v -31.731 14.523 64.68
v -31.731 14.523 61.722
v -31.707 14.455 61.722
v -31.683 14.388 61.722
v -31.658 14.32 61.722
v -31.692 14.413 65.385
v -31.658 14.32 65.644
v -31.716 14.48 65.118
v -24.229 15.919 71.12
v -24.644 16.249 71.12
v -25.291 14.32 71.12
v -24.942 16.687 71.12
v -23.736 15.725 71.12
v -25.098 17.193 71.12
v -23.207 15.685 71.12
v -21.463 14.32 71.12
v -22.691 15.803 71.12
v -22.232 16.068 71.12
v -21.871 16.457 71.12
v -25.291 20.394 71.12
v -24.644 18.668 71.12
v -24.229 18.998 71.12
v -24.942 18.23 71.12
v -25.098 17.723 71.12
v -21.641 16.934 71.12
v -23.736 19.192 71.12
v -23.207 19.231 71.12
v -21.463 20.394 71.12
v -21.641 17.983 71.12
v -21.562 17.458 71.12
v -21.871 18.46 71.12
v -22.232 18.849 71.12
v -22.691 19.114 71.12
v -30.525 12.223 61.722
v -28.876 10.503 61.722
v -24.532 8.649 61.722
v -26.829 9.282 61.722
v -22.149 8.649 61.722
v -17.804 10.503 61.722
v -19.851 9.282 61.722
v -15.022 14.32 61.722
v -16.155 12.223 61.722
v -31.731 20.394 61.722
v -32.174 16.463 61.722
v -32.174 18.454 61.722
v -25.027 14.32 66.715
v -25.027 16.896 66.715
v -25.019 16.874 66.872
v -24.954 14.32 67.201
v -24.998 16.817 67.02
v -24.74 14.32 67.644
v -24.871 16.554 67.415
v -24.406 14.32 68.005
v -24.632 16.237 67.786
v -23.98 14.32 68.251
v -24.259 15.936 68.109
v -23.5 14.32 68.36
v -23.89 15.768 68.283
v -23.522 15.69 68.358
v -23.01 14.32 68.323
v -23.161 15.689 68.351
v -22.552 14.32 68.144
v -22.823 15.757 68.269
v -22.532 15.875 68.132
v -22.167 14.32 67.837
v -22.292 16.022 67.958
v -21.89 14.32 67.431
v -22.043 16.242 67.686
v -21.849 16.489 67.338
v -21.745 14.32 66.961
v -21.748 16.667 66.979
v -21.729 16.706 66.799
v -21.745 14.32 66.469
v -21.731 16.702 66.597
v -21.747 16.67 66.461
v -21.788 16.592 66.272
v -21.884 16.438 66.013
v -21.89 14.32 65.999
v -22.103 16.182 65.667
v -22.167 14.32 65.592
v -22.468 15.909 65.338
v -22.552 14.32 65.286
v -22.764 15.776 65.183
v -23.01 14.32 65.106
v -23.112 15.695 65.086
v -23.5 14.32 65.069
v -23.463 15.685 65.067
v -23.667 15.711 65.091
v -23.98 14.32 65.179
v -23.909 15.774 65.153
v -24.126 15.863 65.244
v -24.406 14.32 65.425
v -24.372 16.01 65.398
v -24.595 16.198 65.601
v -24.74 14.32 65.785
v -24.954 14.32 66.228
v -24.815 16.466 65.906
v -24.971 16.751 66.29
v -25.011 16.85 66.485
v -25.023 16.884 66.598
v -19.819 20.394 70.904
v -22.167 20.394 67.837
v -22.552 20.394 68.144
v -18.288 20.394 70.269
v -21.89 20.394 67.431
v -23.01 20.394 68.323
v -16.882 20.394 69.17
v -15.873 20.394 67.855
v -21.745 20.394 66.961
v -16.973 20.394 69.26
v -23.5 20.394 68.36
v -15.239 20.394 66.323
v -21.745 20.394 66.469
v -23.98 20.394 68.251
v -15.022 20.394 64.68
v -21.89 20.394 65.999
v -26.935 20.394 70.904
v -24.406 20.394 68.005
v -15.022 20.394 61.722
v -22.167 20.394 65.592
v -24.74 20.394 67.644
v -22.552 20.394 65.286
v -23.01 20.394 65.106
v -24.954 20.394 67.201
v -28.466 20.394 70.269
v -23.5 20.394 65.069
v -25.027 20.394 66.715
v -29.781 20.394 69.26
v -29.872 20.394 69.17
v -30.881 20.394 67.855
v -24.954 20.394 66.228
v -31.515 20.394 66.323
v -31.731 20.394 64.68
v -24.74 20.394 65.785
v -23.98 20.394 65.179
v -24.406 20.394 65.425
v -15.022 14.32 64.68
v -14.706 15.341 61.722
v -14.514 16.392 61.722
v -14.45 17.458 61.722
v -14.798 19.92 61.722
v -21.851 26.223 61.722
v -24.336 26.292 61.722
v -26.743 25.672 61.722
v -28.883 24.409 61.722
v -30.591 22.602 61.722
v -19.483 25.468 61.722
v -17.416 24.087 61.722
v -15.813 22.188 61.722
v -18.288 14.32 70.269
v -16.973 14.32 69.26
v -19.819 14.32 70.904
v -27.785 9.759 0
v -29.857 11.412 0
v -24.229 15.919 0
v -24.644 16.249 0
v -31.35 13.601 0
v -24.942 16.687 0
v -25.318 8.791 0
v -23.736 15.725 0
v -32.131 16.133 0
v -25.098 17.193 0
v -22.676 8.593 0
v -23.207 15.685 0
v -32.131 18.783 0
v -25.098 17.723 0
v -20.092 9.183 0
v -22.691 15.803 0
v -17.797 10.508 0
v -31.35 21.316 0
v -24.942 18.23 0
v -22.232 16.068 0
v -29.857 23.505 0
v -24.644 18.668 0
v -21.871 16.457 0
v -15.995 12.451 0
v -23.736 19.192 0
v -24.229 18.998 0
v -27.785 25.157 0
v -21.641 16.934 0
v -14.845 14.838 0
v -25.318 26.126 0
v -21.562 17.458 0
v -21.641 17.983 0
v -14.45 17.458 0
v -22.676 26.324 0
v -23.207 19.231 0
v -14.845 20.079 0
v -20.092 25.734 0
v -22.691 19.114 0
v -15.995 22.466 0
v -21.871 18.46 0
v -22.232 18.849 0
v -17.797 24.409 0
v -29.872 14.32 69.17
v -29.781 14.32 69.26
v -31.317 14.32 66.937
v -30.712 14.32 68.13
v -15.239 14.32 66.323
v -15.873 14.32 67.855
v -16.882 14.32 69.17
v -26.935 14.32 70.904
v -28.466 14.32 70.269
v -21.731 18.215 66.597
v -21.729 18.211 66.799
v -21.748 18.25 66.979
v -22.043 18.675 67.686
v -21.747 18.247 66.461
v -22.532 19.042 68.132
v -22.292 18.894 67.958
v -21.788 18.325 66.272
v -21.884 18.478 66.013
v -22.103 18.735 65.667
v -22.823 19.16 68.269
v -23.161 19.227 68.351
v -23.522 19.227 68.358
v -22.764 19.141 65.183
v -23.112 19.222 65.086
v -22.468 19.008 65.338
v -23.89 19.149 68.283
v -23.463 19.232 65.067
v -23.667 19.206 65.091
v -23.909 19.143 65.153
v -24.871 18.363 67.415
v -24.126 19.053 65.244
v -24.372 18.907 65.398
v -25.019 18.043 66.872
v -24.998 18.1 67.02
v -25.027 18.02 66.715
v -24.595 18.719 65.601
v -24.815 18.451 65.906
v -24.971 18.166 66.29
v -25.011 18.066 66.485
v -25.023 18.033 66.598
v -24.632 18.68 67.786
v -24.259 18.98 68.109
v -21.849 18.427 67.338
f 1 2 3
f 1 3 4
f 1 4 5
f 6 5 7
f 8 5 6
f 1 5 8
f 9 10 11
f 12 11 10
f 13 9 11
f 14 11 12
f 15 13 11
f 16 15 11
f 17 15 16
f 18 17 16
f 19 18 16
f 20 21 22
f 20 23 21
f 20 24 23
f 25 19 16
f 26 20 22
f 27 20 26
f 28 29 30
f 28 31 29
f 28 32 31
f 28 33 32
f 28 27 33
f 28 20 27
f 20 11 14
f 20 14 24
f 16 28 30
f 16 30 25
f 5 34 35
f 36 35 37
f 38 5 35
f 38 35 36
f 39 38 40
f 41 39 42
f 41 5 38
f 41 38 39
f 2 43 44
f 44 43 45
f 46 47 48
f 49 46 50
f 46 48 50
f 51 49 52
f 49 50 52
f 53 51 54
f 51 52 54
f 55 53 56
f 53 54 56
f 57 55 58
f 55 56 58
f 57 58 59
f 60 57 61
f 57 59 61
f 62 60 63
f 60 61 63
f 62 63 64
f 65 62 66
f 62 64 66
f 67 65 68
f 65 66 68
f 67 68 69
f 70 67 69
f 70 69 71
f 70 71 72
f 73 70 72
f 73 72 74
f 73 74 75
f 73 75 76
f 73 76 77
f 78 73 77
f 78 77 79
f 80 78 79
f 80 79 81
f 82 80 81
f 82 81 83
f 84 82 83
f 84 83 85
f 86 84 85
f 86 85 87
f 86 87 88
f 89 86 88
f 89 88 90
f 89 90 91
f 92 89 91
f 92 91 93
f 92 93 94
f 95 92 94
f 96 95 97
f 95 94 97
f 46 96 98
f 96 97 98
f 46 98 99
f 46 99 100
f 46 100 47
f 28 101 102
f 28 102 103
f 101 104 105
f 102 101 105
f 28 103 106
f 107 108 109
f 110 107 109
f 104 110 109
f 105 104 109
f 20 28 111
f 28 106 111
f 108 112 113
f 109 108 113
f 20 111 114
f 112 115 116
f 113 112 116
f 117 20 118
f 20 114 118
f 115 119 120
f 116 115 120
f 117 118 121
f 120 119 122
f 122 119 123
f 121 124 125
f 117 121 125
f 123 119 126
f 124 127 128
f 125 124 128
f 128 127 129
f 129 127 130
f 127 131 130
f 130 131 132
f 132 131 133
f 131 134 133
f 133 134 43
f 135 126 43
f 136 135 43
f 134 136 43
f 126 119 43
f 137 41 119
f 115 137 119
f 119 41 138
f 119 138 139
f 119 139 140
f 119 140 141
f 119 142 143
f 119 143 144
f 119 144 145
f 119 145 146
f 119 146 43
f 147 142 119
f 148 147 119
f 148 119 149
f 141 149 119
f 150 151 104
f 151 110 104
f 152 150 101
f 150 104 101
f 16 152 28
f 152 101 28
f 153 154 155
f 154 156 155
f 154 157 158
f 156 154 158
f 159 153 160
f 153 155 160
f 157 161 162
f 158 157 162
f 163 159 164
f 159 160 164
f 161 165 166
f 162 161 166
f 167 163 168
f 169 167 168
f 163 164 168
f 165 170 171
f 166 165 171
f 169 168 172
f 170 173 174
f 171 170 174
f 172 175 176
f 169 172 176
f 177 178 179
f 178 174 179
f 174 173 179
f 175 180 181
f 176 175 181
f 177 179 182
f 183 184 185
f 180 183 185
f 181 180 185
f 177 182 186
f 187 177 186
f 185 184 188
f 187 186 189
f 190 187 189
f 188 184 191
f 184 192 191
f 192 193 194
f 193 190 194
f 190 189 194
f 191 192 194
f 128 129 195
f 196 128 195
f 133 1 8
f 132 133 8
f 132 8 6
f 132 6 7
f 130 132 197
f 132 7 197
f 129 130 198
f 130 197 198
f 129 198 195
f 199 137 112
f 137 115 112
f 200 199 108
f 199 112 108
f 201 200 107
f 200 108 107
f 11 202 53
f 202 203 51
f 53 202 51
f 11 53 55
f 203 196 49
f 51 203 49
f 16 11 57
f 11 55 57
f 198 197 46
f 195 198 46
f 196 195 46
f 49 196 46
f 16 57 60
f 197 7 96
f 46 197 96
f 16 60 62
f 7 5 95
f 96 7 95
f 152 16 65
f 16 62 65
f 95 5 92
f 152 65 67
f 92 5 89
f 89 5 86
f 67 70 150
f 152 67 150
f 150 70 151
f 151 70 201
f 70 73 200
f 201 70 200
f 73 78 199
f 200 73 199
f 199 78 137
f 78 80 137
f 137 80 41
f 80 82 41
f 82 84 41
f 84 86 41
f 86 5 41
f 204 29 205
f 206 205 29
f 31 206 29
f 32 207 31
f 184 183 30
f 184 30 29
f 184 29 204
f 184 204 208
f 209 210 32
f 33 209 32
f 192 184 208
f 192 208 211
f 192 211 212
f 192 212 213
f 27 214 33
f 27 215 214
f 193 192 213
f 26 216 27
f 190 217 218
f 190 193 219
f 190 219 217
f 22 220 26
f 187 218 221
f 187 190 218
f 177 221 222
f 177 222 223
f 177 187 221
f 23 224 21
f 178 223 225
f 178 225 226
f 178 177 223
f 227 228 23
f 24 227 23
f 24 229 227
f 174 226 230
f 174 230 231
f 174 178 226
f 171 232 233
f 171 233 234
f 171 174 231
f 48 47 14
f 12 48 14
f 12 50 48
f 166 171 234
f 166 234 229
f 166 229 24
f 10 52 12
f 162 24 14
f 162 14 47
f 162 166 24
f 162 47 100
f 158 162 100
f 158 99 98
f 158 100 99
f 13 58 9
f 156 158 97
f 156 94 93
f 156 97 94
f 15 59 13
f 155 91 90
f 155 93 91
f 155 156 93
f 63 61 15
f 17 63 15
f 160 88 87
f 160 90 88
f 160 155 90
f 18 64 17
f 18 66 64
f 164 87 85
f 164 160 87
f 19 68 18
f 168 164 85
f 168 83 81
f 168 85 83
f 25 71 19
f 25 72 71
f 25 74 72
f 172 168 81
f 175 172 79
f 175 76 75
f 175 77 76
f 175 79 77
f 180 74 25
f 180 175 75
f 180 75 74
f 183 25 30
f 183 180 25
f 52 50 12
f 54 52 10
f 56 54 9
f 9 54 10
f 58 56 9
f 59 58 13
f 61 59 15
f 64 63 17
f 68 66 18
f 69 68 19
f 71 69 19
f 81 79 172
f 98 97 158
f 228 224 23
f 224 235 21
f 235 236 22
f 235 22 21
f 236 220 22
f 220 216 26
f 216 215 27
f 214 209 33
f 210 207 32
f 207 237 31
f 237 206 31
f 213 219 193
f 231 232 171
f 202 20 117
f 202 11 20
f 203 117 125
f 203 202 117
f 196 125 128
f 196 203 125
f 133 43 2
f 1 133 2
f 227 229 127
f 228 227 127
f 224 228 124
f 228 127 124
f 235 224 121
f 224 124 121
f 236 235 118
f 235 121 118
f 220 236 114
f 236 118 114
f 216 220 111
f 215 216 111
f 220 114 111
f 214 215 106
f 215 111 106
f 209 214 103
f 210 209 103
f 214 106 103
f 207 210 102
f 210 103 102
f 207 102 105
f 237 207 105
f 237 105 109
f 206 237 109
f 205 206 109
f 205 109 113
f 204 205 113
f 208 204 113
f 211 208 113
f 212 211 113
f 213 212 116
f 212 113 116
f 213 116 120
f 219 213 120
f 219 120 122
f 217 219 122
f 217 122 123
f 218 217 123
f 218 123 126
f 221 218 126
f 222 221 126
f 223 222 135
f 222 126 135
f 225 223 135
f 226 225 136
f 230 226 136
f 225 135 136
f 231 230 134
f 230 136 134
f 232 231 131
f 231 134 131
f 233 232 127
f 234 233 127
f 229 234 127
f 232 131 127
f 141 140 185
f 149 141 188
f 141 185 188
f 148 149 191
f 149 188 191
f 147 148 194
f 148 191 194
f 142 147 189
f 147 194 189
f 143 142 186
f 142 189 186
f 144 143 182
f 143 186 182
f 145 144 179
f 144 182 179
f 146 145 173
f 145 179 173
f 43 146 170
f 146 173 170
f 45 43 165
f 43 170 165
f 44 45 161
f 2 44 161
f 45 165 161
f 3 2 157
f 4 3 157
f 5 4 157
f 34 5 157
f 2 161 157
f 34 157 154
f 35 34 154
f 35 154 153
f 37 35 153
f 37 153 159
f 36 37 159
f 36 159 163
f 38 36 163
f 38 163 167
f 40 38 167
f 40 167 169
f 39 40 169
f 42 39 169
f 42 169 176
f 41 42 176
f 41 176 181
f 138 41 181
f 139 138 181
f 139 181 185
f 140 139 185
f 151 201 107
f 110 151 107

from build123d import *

# Parameters (mm, degrees)
F0_R     = 8.8899932806
F0_R_2   = 1.778
F1_DEPTH = 61.722
F2_R     = 1.778
F3_DEPTH = 9.398
F4_SIZE  = 3.81
F5_R     = 6.35
F7_D     = 3.3


with BuildPart() as f1:
    # F0 (on Top) → F1 (new body)
    with BuildSketch(Plane.XY):
        with Locations((-23.340139538, 17.4584258348)):
            Circle(F0_R)
        with Locations((-23.340139538, 17.4584258348)):
            Circle(F0_R_2, mode=Mode.SUBTRACT)
    extrude(amount=F1_DEPTH)

    # F2 (on face) → F3 (join)
    with BuildSketch(Plane.XY.offset(61.722)):
        with BuildLine():
            Line((-15.0224858004, 20.3939921487), (-31.7314702397, 20.3939921487))
            Line((-31.7314702397, 20.3939921487), (-31.7314702397, 14.5228595208))
            ThreePointArc((-31.7314702397, 14.5228595208), (-31.6952463883, 14.4212939558), (-31.6577932757, 14.3201752346))
            Line((-31.6577932757, 14.3201752346), (-15.0224858004, 14.3201752346))
            Line((-15.0224858004, 14.3201752346), (-15.0224858004, 20.3939921487))
        make_face()
        with Locations((-23.340139538, 17.4584258348)):
            Circle(F2_R, mode=Mode.SUBTRACT)
    extrude(amount=F3_DEPTH)

    # F4
    f4_edges = [f1.edges().sort_by_distance(p)[0] for p in [
        (-15.022486, 17.357084, 71.12),
        (-31.73147, 17.458426, 71.12),
    ]]
    chamfer(f4_edges, length=F4_SIZE)

    # F5
    f5_edges = [f1.edges().sort_by_distance(p)[0] for p in [
        (-27.92147, 17.357084, 71.12),
        (-18.832486, 17.357084, 71.12),
        (-15.022486, 17.357084, 67.31),
        (-31.73147, 17.458426, 67.31),
    ]]
    fillet(f5_edges, radius=F5_R)

    # F7 (through all)
    with Locations(Plane.XZ.offset(-14.3201752346)):
        with Locations((-23.3769780201, 66.7147636414)):
            Hole(F7_D / 2)


solid = f1.part
